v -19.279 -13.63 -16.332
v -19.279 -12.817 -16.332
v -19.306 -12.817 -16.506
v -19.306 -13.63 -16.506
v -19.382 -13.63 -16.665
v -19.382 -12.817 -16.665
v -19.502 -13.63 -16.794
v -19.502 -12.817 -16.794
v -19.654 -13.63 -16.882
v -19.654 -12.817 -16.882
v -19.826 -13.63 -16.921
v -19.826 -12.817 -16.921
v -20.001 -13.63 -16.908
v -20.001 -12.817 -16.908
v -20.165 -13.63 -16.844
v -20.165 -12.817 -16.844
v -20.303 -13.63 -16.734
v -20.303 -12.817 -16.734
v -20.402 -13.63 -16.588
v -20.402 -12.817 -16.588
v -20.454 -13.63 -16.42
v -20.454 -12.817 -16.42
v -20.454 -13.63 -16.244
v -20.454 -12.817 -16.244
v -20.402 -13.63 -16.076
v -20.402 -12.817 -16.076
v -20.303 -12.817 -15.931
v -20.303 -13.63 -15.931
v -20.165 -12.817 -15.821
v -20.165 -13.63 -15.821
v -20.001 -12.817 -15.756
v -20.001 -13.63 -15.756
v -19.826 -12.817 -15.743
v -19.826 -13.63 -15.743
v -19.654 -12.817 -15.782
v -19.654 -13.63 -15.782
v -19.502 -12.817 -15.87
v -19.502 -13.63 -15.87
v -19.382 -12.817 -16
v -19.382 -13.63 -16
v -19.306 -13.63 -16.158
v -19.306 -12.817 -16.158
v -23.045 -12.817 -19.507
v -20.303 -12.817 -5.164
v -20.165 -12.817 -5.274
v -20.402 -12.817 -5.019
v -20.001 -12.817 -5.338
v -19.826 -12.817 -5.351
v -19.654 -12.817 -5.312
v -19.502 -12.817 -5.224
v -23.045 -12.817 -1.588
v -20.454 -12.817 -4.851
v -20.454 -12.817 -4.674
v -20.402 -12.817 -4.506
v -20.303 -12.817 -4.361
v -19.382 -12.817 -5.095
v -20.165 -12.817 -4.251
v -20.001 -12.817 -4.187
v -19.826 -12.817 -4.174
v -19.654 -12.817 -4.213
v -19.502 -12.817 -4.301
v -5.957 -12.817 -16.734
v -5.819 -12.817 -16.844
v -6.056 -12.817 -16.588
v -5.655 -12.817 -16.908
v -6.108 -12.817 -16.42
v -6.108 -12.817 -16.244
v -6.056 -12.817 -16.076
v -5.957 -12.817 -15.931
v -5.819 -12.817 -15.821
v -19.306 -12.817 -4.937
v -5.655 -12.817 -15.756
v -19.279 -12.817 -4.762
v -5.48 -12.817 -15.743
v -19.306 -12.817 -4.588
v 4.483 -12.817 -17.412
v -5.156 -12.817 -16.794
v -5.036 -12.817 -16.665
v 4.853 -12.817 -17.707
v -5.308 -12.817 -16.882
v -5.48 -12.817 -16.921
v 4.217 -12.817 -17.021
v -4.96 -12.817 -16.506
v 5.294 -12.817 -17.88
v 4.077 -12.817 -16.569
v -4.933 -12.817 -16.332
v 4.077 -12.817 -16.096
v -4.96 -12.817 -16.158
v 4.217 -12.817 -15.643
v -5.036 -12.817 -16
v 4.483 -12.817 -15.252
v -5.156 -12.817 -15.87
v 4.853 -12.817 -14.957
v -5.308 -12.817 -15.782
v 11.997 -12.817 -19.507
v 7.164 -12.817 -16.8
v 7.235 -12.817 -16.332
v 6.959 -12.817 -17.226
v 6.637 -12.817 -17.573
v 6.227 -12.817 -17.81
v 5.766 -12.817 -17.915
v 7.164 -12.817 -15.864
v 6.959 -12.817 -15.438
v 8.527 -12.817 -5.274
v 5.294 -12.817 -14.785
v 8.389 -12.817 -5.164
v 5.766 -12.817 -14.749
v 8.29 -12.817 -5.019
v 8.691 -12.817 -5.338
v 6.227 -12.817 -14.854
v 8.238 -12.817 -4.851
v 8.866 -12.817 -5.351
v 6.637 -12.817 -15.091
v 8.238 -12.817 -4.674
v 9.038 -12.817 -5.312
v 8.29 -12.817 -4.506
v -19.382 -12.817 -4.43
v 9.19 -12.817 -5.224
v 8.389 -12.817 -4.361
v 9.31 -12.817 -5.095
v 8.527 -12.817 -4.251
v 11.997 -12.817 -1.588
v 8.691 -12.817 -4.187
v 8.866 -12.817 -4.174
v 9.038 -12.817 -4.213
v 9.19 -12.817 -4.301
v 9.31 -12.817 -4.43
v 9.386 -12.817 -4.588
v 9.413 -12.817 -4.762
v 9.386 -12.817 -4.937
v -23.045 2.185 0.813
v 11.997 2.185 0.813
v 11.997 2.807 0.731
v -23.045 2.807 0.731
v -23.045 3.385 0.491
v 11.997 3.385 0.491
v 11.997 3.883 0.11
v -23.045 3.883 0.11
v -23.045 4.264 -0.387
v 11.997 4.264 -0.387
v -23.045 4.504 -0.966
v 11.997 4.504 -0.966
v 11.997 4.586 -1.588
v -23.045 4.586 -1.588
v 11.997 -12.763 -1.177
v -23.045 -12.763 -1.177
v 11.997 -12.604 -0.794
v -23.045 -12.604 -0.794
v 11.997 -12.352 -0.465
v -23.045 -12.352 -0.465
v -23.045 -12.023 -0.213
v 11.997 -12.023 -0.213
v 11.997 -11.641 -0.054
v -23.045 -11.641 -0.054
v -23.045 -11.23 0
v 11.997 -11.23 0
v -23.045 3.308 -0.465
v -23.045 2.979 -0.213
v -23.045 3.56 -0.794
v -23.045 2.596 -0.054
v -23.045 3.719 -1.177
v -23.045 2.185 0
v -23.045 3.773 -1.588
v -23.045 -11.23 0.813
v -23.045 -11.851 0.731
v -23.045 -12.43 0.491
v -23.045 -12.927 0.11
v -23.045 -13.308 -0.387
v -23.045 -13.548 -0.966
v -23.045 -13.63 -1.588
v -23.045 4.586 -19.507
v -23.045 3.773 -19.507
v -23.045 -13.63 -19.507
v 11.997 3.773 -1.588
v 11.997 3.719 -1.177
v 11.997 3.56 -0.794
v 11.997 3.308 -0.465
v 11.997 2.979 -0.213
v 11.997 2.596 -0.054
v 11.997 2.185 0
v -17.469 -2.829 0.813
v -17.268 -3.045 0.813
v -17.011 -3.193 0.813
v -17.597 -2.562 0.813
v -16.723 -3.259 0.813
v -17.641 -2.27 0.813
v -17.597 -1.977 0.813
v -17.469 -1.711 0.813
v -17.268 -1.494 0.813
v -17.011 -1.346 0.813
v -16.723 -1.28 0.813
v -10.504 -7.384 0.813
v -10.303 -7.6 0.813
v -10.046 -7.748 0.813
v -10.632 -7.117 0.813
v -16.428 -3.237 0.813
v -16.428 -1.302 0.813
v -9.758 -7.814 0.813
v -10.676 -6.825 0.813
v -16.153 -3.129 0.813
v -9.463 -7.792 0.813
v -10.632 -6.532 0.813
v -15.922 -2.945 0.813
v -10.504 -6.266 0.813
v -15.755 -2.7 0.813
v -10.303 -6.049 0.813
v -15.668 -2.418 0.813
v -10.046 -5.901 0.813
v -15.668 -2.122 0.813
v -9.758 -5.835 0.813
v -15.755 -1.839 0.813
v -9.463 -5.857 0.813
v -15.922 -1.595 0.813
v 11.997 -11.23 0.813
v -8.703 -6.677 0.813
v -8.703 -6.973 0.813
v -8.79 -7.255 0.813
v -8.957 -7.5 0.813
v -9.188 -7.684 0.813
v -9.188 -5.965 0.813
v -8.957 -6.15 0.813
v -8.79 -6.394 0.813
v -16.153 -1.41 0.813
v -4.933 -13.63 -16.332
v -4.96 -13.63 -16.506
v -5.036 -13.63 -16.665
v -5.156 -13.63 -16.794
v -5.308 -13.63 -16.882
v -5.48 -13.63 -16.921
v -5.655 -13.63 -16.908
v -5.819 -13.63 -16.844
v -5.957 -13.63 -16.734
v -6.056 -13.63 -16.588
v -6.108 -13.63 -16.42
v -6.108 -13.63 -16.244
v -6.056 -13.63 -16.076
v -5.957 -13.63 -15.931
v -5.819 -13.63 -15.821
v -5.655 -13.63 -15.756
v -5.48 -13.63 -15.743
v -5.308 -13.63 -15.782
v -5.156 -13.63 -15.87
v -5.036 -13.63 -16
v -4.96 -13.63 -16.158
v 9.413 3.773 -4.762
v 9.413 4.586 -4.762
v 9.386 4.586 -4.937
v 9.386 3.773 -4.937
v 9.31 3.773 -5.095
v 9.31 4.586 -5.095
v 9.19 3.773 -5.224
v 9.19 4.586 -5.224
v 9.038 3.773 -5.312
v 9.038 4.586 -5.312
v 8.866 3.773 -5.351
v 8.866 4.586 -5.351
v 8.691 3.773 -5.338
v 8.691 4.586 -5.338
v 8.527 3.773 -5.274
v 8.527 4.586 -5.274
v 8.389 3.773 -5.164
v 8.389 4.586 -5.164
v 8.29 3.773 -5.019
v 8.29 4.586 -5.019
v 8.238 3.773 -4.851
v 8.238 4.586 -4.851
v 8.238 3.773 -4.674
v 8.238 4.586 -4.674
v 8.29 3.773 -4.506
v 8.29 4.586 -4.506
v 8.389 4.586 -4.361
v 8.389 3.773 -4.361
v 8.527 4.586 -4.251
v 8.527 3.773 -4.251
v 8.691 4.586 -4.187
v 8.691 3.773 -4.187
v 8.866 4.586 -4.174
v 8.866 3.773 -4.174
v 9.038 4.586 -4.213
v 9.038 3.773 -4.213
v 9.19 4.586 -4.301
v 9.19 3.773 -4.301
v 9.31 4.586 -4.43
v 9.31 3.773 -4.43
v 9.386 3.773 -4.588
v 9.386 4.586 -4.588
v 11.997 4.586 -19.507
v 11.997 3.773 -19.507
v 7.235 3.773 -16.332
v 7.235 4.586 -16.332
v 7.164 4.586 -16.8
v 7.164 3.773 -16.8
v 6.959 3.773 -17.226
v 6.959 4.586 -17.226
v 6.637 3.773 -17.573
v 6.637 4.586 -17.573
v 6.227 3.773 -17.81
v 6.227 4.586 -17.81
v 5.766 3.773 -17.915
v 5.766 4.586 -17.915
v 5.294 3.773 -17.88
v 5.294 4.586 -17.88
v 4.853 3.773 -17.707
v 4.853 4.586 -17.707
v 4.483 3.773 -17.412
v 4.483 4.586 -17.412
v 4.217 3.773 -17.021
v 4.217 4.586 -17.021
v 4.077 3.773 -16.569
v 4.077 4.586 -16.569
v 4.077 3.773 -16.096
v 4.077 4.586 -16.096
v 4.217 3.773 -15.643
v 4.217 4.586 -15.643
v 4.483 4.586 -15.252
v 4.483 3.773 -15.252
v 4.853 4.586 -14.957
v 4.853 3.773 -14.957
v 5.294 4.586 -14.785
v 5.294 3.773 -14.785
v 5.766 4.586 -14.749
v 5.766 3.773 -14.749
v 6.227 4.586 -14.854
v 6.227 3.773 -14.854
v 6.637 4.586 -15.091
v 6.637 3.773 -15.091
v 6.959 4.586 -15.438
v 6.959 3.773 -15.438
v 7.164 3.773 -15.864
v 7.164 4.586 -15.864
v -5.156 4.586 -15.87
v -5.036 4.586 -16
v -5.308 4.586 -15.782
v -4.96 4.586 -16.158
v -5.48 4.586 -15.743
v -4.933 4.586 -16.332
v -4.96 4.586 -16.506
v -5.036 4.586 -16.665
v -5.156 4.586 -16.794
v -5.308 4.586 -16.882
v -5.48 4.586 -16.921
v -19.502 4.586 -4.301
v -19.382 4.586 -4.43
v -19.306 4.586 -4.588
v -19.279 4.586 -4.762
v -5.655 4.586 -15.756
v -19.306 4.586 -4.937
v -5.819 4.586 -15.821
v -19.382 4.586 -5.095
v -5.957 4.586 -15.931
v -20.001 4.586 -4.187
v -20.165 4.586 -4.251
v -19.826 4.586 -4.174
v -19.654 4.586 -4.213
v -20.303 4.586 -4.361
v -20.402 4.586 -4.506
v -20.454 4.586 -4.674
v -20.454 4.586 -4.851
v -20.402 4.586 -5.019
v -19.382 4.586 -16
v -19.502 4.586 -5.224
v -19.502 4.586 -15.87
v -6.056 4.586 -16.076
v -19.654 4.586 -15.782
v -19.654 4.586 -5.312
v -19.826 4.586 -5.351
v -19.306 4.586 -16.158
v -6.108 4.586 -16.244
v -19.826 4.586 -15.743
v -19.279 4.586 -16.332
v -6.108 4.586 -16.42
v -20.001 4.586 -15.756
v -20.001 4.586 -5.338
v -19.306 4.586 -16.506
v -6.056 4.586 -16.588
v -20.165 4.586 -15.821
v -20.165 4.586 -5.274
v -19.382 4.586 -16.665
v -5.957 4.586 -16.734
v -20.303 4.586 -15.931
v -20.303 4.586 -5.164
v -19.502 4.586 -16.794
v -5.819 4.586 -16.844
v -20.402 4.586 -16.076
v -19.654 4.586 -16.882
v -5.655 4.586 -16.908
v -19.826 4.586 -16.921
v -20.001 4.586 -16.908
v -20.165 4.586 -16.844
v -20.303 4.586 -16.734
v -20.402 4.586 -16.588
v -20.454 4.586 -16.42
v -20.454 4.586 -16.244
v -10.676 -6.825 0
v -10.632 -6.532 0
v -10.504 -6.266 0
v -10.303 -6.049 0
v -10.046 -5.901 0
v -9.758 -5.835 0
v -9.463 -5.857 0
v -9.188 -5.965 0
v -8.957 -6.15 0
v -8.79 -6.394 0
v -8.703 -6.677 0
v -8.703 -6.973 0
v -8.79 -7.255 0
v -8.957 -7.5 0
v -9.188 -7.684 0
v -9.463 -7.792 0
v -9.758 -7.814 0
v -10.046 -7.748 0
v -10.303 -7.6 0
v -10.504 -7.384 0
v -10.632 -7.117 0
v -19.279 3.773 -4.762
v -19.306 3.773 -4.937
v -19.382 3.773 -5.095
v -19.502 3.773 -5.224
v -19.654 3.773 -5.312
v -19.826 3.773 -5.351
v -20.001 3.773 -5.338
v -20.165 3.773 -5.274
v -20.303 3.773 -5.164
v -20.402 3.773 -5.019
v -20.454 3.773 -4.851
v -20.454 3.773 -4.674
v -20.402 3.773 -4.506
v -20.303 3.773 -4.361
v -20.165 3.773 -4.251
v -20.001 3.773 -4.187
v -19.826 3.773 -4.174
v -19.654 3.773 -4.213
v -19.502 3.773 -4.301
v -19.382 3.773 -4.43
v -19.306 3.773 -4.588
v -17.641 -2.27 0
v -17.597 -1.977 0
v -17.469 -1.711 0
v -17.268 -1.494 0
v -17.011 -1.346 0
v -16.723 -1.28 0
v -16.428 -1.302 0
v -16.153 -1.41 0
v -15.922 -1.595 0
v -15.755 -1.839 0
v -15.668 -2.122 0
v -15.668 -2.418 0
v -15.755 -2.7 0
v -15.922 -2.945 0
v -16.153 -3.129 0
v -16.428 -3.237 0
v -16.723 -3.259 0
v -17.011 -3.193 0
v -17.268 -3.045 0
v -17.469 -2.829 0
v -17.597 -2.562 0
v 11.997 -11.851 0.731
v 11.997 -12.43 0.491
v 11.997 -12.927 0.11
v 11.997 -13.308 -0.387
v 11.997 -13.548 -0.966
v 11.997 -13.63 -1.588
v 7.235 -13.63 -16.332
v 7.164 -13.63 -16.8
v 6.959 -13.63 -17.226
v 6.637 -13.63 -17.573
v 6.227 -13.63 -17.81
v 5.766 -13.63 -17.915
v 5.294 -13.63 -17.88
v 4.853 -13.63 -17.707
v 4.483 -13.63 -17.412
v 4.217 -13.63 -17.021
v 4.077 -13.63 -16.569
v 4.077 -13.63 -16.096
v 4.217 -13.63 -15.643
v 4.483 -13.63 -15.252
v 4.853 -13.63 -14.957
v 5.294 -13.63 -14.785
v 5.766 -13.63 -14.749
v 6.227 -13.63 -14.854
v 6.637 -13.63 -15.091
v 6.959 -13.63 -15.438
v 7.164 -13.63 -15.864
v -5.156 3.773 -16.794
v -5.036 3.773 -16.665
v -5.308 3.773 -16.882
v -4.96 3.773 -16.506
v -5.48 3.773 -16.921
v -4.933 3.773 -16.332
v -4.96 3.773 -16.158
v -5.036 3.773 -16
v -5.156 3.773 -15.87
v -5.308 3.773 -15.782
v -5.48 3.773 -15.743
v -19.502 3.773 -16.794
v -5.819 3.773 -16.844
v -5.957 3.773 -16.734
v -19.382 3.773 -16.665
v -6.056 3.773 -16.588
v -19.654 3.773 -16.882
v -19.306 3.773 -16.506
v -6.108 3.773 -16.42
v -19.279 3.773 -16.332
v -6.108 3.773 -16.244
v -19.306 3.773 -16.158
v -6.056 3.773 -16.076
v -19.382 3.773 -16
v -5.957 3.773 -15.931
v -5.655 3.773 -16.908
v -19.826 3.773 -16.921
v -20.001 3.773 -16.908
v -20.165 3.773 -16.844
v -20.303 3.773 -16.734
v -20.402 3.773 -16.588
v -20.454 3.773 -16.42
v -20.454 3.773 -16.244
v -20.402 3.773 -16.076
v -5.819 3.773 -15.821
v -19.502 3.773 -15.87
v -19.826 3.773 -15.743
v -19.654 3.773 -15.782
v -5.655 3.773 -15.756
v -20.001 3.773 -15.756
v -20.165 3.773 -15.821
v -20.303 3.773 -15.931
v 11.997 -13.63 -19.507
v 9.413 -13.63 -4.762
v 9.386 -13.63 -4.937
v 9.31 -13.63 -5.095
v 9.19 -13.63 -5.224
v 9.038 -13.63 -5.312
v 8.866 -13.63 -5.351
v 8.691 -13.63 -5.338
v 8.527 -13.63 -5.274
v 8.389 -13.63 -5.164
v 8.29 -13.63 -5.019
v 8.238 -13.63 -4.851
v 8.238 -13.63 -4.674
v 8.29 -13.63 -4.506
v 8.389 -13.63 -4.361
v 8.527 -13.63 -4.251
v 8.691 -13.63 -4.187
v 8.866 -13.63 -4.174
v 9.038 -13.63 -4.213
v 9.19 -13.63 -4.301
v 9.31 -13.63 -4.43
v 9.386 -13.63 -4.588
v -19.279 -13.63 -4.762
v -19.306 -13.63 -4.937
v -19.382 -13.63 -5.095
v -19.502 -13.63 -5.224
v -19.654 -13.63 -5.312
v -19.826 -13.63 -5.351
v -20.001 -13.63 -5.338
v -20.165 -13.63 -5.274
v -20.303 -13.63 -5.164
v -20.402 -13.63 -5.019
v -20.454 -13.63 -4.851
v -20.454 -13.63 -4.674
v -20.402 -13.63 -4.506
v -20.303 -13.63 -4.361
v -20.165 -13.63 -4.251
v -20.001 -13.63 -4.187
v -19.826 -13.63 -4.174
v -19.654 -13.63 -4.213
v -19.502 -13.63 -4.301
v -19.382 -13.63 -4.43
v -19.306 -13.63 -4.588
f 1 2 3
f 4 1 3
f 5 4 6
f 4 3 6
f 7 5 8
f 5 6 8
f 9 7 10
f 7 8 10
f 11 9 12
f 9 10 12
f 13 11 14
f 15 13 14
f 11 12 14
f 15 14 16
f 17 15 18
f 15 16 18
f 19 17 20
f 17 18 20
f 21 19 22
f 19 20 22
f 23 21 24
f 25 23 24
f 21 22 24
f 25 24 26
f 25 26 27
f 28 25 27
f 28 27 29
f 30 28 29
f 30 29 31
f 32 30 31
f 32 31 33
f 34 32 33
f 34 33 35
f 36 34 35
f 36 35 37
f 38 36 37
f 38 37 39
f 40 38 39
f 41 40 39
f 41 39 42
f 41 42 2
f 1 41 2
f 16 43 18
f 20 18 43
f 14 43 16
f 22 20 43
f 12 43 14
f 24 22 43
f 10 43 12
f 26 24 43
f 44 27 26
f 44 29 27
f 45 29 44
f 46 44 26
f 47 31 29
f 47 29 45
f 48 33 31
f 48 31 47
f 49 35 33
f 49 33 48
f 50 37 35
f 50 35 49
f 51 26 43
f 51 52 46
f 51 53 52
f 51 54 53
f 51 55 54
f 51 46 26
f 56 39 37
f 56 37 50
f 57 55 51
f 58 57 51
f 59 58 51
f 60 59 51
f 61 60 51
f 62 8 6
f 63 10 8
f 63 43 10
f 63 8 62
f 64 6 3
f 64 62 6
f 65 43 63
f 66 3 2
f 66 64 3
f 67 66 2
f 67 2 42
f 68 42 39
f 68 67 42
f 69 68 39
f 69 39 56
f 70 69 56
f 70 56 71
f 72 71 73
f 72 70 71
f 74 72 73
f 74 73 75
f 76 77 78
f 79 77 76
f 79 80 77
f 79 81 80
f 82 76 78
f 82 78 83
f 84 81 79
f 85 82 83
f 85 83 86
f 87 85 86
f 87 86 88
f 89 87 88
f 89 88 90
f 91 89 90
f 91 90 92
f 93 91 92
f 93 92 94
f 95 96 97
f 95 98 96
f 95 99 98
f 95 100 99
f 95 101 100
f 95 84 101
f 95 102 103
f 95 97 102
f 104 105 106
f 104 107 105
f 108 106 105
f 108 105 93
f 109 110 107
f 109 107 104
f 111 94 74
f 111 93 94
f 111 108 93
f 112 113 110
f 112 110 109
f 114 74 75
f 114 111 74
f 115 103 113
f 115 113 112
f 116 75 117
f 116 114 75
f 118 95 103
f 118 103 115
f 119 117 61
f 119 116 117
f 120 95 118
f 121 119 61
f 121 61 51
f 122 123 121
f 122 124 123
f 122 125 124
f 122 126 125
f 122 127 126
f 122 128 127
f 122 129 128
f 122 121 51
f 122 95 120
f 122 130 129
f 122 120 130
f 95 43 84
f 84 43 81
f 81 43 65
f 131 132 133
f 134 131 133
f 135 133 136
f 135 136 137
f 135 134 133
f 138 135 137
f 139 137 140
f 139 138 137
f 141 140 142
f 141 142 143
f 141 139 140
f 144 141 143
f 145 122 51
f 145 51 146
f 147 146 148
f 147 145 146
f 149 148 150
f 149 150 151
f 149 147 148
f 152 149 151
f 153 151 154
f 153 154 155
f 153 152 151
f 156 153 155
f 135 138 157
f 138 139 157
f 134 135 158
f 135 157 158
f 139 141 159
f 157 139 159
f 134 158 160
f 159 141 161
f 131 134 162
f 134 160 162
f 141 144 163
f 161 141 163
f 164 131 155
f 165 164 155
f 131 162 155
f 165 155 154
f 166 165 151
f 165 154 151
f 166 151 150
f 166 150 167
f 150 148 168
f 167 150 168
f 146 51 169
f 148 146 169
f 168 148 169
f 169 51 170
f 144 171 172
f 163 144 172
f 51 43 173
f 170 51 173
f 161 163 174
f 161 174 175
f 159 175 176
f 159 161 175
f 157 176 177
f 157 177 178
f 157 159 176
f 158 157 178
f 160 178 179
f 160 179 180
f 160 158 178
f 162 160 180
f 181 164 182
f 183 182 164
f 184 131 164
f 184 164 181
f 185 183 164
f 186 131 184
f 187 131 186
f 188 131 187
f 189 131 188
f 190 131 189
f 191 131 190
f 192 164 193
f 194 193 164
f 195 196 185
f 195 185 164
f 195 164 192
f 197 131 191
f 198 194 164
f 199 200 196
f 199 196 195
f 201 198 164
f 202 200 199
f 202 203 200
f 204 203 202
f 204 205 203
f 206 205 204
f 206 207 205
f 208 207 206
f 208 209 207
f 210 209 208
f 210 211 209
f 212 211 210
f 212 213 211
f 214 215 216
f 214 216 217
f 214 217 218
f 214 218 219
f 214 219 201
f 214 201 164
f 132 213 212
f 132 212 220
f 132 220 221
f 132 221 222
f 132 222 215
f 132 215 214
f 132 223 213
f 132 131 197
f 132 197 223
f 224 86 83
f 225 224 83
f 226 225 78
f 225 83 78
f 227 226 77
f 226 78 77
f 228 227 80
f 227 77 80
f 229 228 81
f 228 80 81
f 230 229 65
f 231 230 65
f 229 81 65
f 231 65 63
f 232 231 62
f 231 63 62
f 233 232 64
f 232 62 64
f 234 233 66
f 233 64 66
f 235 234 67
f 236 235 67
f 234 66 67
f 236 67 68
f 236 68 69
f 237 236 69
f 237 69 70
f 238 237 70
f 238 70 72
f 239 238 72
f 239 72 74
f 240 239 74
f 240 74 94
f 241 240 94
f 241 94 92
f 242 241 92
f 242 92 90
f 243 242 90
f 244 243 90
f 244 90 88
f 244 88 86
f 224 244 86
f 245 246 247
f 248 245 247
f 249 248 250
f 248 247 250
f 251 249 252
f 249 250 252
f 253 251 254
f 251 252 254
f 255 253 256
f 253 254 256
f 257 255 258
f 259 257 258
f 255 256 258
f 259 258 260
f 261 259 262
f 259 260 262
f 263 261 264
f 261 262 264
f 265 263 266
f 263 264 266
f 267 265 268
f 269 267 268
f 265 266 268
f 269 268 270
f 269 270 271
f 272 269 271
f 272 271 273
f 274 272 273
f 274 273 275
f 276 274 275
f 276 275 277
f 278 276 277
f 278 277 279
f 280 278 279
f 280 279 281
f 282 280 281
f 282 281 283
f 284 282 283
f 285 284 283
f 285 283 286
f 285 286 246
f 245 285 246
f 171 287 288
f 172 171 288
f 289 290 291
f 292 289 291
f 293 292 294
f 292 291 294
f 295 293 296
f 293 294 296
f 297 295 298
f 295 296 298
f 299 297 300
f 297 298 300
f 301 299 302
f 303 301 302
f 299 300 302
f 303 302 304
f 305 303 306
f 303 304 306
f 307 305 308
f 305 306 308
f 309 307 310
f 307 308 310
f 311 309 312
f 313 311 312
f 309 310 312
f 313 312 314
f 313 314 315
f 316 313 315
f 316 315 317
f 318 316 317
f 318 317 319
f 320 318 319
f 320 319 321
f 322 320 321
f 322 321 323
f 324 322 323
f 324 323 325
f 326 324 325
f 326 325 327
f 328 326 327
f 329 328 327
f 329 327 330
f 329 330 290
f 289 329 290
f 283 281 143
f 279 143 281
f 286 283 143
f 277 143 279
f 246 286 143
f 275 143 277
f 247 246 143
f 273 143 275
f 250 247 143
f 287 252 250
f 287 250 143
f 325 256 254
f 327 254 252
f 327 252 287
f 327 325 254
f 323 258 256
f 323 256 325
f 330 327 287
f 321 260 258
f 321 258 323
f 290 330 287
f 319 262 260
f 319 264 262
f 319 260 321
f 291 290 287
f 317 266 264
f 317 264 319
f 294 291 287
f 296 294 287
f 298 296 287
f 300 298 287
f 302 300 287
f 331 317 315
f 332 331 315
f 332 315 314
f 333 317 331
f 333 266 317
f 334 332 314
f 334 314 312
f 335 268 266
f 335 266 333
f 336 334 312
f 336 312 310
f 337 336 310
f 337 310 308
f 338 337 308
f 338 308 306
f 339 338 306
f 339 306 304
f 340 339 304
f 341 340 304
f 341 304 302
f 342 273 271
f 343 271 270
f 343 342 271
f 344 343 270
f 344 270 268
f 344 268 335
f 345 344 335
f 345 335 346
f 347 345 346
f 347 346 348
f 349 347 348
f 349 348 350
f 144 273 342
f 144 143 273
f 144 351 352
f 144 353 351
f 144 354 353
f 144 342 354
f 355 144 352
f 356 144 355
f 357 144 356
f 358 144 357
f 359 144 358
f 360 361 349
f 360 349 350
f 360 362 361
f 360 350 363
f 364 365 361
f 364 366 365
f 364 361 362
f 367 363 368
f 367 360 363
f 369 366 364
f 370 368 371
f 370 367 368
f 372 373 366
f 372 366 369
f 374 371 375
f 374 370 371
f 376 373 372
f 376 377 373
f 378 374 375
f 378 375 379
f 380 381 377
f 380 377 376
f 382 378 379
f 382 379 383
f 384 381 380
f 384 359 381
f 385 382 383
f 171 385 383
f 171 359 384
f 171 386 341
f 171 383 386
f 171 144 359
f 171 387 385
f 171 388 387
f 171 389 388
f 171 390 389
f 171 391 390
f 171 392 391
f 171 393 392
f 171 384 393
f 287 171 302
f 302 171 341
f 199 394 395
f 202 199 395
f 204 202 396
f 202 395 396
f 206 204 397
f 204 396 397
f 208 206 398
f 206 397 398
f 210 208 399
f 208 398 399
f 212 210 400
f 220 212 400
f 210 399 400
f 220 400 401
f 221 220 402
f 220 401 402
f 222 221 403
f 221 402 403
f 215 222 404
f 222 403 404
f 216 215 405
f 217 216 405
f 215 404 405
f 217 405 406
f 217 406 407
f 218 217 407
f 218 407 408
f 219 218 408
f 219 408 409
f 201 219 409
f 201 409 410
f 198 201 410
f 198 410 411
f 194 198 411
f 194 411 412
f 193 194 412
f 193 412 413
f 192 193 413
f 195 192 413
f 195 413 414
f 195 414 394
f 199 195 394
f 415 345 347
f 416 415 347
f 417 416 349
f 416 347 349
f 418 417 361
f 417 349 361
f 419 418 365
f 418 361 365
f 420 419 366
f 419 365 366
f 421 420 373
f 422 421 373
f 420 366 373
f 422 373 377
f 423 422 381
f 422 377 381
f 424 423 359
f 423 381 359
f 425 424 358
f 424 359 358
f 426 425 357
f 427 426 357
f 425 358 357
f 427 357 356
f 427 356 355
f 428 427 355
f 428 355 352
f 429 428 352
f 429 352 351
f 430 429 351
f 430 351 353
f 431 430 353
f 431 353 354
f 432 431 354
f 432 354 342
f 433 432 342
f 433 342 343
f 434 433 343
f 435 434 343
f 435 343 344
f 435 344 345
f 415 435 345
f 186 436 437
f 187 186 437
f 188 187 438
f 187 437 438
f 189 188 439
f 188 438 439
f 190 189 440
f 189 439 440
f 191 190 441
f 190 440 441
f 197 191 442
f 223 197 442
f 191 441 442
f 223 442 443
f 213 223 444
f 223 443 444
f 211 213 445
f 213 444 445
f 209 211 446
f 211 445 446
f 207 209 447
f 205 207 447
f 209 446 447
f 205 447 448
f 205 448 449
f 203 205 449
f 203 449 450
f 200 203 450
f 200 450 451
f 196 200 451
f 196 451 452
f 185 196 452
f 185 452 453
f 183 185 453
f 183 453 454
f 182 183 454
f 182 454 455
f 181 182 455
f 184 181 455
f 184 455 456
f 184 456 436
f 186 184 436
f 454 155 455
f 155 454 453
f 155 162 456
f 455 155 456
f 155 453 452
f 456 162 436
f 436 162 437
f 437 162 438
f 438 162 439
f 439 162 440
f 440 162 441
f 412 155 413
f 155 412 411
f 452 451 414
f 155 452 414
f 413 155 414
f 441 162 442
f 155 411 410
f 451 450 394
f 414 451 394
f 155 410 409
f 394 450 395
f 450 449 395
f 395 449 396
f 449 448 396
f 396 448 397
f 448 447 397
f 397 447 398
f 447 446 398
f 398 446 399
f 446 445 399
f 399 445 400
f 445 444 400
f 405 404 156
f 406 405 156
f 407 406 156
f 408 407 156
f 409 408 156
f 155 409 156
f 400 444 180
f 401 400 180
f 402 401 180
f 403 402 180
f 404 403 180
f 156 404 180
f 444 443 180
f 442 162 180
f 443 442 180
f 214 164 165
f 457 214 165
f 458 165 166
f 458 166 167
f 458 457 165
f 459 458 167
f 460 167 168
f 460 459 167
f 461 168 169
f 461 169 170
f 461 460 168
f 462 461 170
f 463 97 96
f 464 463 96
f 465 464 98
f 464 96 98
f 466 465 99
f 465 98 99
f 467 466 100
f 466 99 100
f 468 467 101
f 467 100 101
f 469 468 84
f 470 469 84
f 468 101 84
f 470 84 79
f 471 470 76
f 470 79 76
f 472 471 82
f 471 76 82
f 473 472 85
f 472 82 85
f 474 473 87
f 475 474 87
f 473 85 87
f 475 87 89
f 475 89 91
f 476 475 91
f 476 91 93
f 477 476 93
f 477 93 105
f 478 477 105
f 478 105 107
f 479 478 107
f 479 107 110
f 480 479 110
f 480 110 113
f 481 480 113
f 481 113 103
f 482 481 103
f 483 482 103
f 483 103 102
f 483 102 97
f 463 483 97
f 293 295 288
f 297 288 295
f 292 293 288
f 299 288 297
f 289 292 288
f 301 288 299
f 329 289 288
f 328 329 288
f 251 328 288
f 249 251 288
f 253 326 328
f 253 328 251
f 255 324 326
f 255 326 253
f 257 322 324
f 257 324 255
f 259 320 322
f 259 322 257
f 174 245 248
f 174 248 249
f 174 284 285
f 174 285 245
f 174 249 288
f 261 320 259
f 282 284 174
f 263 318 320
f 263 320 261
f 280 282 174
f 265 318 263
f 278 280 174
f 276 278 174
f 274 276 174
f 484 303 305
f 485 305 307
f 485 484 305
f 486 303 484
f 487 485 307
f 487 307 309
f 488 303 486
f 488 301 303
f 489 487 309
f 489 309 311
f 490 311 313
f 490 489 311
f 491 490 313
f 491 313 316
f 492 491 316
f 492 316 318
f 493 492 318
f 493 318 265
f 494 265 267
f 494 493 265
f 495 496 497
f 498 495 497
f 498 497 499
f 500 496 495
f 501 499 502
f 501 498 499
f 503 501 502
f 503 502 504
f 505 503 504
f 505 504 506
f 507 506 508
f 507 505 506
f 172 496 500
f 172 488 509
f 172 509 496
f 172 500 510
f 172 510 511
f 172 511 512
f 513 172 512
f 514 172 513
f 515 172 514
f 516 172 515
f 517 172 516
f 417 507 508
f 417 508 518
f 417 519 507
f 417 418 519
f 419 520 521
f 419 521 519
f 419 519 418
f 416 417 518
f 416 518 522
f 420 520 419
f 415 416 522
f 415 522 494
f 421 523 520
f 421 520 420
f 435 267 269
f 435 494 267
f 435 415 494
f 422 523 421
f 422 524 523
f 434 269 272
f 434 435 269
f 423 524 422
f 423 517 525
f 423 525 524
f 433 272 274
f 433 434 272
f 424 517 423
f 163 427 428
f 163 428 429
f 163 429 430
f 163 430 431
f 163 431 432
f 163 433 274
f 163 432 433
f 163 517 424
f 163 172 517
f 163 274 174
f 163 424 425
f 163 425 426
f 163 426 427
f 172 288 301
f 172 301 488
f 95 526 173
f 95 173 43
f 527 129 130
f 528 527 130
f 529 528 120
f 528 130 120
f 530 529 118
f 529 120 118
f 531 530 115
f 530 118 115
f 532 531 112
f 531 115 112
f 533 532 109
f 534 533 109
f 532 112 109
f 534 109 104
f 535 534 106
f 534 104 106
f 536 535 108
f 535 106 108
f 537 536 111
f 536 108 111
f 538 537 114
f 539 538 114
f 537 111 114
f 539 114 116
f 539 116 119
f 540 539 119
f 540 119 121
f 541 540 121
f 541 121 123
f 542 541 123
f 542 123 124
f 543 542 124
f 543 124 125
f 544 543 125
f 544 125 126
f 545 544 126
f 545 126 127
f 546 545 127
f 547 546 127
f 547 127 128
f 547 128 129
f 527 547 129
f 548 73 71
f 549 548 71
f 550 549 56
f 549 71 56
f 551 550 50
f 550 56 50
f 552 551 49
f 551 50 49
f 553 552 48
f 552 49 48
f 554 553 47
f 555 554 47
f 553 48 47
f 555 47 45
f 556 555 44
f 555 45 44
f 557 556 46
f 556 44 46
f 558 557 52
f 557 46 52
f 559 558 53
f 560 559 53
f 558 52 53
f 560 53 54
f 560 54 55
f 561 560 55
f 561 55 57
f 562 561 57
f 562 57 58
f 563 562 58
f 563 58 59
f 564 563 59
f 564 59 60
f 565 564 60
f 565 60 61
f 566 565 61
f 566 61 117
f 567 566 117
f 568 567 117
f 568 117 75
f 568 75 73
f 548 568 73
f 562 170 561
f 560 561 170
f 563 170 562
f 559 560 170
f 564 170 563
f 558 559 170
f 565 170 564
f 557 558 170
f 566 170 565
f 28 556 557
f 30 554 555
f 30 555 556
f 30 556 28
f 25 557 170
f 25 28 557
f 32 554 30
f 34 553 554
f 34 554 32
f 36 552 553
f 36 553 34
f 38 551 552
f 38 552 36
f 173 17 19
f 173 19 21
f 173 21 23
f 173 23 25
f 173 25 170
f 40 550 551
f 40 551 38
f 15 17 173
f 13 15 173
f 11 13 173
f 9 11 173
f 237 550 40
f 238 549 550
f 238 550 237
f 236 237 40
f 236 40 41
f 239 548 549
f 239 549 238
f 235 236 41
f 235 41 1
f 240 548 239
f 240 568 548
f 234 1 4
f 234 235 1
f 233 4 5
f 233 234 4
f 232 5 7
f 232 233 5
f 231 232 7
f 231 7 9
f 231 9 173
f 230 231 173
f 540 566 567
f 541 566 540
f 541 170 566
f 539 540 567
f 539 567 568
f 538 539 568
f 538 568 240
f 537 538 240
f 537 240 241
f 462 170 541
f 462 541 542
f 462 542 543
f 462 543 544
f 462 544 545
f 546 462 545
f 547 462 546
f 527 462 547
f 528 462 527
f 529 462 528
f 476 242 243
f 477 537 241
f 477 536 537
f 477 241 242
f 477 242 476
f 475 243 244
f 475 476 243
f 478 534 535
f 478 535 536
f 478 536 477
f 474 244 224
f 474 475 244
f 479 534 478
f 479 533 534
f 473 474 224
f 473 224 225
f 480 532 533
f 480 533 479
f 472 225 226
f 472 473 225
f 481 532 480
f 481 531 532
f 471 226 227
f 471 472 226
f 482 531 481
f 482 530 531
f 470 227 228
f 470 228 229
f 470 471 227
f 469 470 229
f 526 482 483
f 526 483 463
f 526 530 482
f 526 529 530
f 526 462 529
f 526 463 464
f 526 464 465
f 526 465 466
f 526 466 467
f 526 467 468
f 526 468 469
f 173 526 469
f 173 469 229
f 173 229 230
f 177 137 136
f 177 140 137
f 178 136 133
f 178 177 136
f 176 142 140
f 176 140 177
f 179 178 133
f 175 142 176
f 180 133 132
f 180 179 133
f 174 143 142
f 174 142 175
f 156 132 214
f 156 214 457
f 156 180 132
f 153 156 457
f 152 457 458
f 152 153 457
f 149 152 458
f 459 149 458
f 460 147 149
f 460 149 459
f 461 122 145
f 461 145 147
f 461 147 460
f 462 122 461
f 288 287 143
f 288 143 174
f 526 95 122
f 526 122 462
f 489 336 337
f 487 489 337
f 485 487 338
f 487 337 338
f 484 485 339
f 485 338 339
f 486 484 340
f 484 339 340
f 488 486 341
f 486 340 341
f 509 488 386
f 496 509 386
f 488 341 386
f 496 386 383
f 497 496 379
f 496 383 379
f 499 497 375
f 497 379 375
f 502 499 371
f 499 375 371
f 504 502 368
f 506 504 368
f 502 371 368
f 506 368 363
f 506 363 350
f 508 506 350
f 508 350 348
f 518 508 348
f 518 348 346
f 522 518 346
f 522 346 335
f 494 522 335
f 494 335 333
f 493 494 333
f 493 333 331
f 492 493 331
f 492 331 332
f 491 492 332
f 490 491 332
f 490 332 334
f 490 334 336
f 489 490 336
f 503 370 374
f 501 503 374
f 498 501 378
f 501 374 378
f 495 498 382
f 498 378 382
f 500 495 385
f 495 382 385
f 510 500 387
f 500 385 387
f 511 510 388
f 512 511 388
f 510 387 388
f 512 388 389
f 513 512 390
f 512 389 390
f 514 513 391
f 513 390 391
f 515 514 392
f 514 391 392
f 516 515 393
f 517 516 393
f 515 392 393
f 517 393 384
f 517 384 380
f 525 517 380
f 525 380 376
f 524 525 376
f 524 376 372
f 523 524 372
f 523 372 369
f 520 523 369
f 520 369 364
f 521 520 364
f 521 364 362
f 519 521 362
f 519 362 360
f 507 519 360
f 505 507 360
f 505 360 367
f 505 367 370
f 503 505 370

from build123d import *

# Parameters (mm, degrees)
BASE_FLANGE1_DEPTH              = 0.8128
EDGE_FLANGE1_STRIP_W            = 6.4262
EDGE_FLANGE1_STRIP_H            = 0.8128
EDGE_FLANGE1_STRIP_CUT_DEPTH    = 35.042145822
EDGE_FLANGE1_STRIP_2_W          = 6.4262
EDGE_FLANGE1_STRIP_2_H          = 0.8128
EDGE_FLANGE1_STRIP_CUT_2_DEPTH  = 35.042145822
EDGE_FLANGE1_DEPTH              = 35.042145822
EDGE_FLANGE1_BEND_DEPTH         = 35.042145822
F_1_8_0_125_DIAMETER_HOLE1_D    = 3.175
F_56_0_0465_DIAMETER_HOLE1_D    = 1.1811
F_5_64_0_07813_DIAMETER_HOLE1_D = 1.984502


# Sheet-metal steps are written as plain solids
with BuildPart() as part:
    # Sketch1 → Base-Flange1 (new body)
    with BuildSketch(Plane.XY):
        Polygon((-23.044963434, -12.817151558), (5.647182388, -12.817151558), (11.997182388, -12.817151558), (11.997182388, 3.772848442), (5.647182388, 3.772848442), (-23.044963434, 3.772848442), align=None)
    extrude(amount=BASE_FLANGE1_DEPTH)

    # Edge-Flange1 strip (across the edge) → Edge-Flange1 strip cut (cut)
    with BuildSketch(Plane(origin=(-23.044963434, 3.772848442, 0), x_dir=(0, -1, 0), z_dir=(1, 0, 0))):
        with Locations((-1.6256, -0.4064)):
            Rectangle(EDGE_FLANGE1_STRIP_W, EDGE_FLANGE1_STRIP_H)
    extrude(amount=EDGE_FLANGE1_STRIP_CUT_DEPTH, mode=Mode.SUBTRACT)

    # Edge-Flange1 strip 2 (across the edge) → Edge-Flange1 strip cut 2 (cut)
    with BuildSketch(Plane(origin=(11.997182388, -12.817151558, 0), x_dir=(0, 1, 0), z_dir=(-1, 0, 0))):
        with Locations((-1.6256, -0.4064)):
            Rectangle(EDGE_FLANGE1_STRIP_2_W, EDGE_FLANGE1_STRIP_2_H)
    extrude(amount=EDGE_FLANGE1_STRIP_CUT_2_DEPTH, mode=Mode.SUBTRACT)

    # Edge-Flange1 section (across the edge) → Edge-Flange1 (add)
    with BuildSketch(Plane(origin=(-23.044963434, 3.772848442, 0), x_dir=(0, -1, 0), z_dir=(1, 0, 0))):
        with BuildLine():
            Line((-0.8128, 1.5875), (-0.8128, 19.5072))
            Line((-0.8128, 19.5072), (0, 19.5072))
            Line((0, 19.5072), (0, 1.5875))
            ThreePointArc((0, 1.5875), (0.464967985, 0.464967985), (1.5875, 0))
            Line((1.5875, 0), (1.5875, -0.8128))
            ThreePointArc((1.5875, -0.8128), (-0.109768407, -0.109768407), (-0.8128, 1.5875))
        make_face()
    extrude(amount=EDGE_FLANGE1_DEPTH)

    # Edge-Flange1 section 2 (across the edge) → Edge-Flange1 bend (add)
    with BuildSketch(Plane(origin=(11.997182388, -12.817151558, 0), x_dir=(0, 1, 0), z_dir=(-1, 0, 0))):
        with BuildLine():
            Line((-0.8128, 1.5875), (-0.8128, 19.5072))
            Line((-0.8128, 19.5072), (0, 19.5072))
            Line((0, 19.5072), (0, 1.5875))
            ThreePointArc((0, 1.5875), (0.464967985, 0.464967985), (1.5875, 0))
            Line((1.5875, 0), (1.5875, -0.8128))
            ThreePointArc((1.5875, -0.8128), (-0.109768407, -0.109768407), (-0.8128, 1.5875))
        make_face()
    extrude(amount=EDGE_FLANGE1_BEND_DEPTH)

    # 1/8 (0.125) Diameter Hole1 (through all)
    with Locations(Plane(origin=(0, -13.629951558, 0), x_dir=(-1, 0, 0), z_dir=(0, -1, 0))):
        with Locations((-5.647182388, 16.3322)):
            Hole(F_1_8_0_125_DIAMETER_HOLE1_D / 2)

    # #56 (0.0465) Diameter Hole1 (through all)
    with Locations(Plane(origin=(0, -13.629951558, 0), x_dir=(-1, 0, 0), z_dir=(0, -1, 0))):
        with Locations((5.523890523, 16.3322), (19.869963434, 16.3322), (19.869963434, 4.7625), (-8.822182388, 4.7625)):
            Hole(F_56_0_0465_DIAMETER_HOLE1_D / 2)

    # 5/64 (0.07813) Diameter Hole1 (through all)
    with Locations(Plane.XY.offset(0.8128)):
        with Locations((-16.648897162, -2.269651558), (-9.683897162, -6.824651558)):
            Hole(F_5_64_0_07813_DIAMETER_HOLE1_D / 2)


solid = part.part
